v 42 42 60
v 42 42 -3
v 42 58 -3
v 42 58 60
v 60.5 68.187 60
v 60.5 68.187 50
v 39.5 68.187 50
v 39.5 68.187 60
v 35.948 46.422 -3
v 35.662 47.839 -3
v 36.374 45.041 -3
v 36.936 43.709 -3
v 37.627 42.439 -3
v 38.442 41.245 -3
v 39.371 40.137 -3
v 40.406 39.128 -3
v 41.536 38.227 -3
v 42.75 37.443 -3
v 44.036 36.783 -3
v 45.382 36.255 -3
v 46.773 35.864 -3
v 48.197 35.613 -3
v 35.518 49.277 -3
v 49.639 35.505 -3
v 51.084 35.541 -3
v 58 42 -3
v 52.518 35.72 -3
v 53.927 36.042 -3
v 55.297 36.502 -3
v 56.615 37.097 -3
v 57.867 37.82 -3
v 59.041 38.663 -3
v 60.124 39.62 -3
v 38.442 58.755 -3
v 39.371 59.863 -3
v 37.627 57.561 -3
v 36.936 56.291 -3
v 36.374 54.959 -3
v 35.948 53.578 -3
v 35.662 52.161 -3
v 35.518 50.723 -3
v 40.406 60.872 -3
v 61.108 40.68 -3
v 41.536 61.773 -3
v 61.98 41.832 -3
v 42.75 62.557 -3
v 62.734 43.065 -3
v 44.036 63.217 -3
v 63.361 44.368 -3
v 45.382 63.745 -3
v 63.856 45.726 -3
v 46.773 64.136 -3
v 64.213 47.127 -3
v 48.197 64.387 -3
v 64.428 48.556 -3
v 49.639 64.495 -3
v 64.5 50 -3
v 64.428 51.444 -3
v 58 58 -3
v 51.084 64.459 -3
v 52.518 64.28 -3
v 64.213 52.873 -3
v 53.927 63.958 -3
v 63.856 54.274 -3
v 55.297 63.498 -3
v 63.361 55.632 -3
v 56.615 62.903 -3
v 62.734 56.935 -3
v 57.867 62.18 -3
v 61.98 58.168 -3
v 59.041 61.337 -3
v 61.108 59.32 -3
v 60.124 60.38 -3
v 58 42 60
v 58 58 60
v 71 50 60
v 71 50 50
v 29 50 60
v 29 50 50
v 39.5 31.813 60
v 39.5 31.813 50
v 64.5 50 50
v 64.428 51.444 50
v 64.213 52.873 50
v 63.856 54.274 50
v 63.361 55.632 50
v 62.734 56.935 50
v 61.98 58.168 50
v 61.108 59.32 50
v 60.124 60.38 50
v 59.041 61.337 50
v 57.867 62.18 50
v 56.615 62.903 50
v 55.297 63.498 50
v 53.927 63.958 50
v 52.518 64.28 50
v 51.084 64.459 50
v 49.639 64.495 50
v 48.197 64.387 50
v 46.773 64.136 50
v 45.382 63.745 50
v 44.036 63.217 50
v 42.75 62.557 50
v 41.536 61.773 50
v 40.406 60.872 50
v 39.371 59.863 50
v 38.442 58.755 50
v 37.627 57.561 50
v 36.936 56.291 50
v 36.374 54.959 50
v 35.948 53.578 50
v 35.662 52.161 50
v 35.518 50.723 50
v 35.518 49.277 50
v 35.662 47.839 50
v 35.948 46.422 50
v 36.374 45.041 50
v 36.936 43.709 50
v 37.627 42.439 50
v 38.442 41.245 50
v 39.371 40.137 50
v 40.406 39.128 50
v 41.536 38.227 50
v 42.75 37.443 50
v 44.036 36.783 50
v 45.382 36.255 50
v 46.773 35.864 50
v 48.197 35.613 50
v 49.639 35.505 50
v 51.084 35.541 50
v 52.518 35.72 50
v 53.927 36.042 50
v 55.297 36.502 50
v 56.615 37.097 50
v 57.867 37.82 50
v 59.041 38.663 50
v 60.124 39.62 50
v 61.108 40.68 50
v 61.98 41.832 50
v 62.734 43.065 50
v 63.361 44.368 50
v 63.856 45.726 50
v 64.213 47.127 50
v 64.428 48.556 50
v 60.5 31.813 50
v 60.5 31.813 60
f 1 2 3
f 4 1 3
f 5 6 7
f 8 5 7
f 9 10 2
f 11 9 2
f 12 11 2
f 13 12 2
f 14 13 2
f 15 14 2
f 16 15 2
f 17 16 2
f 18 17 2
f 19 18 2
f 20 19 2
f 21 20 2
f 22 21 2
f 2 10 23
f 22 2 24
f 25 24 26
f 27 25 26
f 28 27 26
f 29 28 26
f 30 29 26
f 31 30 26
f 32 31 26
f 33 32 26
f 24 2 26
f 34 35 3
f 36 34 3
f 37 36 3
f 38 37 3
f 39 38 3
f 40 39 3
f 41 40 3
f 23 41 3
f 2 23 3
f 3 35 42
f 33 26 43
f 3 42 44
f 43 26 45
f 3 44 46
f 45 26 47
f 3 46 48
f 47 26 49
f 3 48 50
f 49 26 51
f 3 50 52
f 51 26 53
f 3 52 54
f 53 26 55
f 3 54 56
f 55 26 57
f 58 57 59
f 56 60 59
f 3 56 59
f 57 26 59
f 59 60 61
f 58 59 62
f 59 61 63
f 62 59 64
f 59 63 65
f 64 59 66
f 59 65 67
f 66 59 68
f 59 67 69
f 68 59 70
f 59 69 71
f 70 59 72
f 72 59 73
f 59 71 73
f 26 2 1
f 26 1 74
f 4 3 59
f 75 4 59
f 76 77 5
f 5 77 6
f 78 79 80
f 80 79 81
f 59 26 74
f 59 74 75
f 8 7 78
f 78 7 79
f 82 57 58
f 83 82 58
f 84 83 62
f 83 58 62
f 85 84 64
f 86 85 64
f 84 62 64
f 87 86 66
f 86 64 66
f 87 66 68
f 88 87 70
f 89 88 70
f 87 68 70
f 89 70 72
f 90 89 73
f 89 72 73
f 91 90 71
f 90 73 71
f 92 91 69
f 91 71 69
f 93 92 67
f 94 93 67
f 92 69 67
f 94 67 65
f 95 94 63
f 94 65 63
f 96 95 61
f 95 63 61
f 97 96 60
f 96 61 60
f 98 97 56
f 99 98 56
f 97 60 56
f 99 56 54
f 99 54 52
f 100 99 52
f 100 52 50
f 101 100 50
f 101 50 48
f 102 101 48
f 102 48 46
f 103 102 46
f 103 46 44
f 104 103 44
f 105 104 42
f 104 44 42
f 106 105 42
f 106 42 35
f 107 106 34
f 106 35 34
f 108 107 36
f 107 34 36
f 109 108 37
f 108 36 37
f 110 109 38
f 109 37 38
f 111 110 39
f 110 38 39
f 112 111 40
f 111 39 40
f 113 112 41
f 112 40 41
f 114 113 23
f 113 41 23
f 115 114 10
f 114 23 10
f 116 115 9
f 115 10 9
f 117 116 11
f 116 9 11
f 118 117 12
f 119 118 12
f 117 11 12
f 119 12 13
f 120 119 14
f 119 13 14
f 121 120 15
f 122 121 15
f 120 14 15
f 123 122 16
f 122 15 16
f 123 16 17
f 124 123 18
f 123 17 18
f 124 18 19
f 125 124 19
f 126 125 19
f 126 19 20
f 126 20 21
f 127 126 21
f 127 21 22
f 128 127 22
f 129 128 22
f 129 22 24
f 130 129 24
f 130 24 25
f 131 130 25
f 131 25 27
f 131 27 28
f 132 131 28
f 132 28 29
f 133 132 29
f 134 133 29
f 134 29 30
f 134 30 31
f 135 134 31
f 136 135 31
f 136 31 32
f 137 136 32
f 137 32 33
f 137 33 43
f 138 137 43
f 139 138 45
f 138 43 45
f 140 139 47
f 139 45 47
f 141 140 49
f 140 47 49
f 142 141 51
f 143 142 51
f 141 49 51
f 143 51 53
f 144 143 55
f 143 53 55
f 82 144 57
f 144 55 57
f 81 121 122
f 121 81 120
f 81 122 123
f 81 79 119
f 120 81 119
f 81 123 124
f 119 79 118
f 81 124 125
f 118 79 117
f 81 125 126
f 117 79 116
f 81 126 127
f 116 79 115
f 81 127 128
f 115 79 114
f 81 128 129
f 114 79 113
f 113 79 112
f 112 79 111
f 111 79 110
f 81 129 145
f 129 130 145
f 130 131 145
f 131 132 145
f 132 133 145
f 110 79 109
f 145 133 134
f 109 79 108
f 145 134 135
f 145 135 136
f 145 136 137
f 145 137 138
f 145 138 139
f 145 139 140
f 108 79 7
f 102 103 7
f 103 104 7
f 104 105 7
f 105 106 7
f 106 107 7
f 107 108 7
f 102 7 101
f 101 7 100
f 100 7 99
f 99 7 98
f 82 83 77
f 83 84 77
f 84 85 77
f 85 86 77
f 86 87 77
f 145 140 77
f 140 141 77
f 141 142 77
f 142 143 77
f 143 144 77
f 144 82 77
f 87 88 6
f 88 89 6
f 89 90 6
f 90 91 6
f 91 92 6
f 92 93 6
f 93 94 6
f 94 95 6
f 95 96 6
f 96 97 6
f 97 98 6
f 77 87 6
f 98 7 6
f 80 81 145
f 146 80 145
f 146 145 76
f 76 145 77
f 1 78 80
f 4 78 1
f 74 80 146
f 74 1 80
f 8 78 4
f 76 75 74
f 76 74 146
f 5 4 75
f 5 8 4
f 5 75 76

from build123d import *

# Parameters (mm, degrees)
SKETCH_R     = 14.5
PAD_DEPTH    = 53
PAD001_DEPTH = 10
SKETCH001_W  = 16
SKETCH001_H  = 16
POCKET_DEPTH = 70


with BuildPart() as part:
    # Sketch → Pad (new body)
    with BuildSketch(Plane.XY):
        Circle(SKETCH_R)
    extrude(amount=PAD_DEPTH)

    # Sketch002 → Pad001 (join)
    with BuildSketch(Plane.XY.offset(53)):
        Polygon((21, 0), (10.5, 18.186533), (-10.5, 18.186533), (-21, 0), (-10.5, -18.186533), (10.5, -18.186533), align=None)
    extrude(amount=PAD001_DEPTH)

    # Sketch001 → Pocket (cut)
    with BuildSketch(Plane.XY):
        Rectangle(SKETCH001_W, SKETCH001_H)
    extrude(amount=POCKET_DEPTH, mode=Mode.SUBTRACT)


with BuildPart() as part_1:
    # Body placement: moved
    add(part.part.moved(Location((50, 50, -3))))


solid = part_1.part
